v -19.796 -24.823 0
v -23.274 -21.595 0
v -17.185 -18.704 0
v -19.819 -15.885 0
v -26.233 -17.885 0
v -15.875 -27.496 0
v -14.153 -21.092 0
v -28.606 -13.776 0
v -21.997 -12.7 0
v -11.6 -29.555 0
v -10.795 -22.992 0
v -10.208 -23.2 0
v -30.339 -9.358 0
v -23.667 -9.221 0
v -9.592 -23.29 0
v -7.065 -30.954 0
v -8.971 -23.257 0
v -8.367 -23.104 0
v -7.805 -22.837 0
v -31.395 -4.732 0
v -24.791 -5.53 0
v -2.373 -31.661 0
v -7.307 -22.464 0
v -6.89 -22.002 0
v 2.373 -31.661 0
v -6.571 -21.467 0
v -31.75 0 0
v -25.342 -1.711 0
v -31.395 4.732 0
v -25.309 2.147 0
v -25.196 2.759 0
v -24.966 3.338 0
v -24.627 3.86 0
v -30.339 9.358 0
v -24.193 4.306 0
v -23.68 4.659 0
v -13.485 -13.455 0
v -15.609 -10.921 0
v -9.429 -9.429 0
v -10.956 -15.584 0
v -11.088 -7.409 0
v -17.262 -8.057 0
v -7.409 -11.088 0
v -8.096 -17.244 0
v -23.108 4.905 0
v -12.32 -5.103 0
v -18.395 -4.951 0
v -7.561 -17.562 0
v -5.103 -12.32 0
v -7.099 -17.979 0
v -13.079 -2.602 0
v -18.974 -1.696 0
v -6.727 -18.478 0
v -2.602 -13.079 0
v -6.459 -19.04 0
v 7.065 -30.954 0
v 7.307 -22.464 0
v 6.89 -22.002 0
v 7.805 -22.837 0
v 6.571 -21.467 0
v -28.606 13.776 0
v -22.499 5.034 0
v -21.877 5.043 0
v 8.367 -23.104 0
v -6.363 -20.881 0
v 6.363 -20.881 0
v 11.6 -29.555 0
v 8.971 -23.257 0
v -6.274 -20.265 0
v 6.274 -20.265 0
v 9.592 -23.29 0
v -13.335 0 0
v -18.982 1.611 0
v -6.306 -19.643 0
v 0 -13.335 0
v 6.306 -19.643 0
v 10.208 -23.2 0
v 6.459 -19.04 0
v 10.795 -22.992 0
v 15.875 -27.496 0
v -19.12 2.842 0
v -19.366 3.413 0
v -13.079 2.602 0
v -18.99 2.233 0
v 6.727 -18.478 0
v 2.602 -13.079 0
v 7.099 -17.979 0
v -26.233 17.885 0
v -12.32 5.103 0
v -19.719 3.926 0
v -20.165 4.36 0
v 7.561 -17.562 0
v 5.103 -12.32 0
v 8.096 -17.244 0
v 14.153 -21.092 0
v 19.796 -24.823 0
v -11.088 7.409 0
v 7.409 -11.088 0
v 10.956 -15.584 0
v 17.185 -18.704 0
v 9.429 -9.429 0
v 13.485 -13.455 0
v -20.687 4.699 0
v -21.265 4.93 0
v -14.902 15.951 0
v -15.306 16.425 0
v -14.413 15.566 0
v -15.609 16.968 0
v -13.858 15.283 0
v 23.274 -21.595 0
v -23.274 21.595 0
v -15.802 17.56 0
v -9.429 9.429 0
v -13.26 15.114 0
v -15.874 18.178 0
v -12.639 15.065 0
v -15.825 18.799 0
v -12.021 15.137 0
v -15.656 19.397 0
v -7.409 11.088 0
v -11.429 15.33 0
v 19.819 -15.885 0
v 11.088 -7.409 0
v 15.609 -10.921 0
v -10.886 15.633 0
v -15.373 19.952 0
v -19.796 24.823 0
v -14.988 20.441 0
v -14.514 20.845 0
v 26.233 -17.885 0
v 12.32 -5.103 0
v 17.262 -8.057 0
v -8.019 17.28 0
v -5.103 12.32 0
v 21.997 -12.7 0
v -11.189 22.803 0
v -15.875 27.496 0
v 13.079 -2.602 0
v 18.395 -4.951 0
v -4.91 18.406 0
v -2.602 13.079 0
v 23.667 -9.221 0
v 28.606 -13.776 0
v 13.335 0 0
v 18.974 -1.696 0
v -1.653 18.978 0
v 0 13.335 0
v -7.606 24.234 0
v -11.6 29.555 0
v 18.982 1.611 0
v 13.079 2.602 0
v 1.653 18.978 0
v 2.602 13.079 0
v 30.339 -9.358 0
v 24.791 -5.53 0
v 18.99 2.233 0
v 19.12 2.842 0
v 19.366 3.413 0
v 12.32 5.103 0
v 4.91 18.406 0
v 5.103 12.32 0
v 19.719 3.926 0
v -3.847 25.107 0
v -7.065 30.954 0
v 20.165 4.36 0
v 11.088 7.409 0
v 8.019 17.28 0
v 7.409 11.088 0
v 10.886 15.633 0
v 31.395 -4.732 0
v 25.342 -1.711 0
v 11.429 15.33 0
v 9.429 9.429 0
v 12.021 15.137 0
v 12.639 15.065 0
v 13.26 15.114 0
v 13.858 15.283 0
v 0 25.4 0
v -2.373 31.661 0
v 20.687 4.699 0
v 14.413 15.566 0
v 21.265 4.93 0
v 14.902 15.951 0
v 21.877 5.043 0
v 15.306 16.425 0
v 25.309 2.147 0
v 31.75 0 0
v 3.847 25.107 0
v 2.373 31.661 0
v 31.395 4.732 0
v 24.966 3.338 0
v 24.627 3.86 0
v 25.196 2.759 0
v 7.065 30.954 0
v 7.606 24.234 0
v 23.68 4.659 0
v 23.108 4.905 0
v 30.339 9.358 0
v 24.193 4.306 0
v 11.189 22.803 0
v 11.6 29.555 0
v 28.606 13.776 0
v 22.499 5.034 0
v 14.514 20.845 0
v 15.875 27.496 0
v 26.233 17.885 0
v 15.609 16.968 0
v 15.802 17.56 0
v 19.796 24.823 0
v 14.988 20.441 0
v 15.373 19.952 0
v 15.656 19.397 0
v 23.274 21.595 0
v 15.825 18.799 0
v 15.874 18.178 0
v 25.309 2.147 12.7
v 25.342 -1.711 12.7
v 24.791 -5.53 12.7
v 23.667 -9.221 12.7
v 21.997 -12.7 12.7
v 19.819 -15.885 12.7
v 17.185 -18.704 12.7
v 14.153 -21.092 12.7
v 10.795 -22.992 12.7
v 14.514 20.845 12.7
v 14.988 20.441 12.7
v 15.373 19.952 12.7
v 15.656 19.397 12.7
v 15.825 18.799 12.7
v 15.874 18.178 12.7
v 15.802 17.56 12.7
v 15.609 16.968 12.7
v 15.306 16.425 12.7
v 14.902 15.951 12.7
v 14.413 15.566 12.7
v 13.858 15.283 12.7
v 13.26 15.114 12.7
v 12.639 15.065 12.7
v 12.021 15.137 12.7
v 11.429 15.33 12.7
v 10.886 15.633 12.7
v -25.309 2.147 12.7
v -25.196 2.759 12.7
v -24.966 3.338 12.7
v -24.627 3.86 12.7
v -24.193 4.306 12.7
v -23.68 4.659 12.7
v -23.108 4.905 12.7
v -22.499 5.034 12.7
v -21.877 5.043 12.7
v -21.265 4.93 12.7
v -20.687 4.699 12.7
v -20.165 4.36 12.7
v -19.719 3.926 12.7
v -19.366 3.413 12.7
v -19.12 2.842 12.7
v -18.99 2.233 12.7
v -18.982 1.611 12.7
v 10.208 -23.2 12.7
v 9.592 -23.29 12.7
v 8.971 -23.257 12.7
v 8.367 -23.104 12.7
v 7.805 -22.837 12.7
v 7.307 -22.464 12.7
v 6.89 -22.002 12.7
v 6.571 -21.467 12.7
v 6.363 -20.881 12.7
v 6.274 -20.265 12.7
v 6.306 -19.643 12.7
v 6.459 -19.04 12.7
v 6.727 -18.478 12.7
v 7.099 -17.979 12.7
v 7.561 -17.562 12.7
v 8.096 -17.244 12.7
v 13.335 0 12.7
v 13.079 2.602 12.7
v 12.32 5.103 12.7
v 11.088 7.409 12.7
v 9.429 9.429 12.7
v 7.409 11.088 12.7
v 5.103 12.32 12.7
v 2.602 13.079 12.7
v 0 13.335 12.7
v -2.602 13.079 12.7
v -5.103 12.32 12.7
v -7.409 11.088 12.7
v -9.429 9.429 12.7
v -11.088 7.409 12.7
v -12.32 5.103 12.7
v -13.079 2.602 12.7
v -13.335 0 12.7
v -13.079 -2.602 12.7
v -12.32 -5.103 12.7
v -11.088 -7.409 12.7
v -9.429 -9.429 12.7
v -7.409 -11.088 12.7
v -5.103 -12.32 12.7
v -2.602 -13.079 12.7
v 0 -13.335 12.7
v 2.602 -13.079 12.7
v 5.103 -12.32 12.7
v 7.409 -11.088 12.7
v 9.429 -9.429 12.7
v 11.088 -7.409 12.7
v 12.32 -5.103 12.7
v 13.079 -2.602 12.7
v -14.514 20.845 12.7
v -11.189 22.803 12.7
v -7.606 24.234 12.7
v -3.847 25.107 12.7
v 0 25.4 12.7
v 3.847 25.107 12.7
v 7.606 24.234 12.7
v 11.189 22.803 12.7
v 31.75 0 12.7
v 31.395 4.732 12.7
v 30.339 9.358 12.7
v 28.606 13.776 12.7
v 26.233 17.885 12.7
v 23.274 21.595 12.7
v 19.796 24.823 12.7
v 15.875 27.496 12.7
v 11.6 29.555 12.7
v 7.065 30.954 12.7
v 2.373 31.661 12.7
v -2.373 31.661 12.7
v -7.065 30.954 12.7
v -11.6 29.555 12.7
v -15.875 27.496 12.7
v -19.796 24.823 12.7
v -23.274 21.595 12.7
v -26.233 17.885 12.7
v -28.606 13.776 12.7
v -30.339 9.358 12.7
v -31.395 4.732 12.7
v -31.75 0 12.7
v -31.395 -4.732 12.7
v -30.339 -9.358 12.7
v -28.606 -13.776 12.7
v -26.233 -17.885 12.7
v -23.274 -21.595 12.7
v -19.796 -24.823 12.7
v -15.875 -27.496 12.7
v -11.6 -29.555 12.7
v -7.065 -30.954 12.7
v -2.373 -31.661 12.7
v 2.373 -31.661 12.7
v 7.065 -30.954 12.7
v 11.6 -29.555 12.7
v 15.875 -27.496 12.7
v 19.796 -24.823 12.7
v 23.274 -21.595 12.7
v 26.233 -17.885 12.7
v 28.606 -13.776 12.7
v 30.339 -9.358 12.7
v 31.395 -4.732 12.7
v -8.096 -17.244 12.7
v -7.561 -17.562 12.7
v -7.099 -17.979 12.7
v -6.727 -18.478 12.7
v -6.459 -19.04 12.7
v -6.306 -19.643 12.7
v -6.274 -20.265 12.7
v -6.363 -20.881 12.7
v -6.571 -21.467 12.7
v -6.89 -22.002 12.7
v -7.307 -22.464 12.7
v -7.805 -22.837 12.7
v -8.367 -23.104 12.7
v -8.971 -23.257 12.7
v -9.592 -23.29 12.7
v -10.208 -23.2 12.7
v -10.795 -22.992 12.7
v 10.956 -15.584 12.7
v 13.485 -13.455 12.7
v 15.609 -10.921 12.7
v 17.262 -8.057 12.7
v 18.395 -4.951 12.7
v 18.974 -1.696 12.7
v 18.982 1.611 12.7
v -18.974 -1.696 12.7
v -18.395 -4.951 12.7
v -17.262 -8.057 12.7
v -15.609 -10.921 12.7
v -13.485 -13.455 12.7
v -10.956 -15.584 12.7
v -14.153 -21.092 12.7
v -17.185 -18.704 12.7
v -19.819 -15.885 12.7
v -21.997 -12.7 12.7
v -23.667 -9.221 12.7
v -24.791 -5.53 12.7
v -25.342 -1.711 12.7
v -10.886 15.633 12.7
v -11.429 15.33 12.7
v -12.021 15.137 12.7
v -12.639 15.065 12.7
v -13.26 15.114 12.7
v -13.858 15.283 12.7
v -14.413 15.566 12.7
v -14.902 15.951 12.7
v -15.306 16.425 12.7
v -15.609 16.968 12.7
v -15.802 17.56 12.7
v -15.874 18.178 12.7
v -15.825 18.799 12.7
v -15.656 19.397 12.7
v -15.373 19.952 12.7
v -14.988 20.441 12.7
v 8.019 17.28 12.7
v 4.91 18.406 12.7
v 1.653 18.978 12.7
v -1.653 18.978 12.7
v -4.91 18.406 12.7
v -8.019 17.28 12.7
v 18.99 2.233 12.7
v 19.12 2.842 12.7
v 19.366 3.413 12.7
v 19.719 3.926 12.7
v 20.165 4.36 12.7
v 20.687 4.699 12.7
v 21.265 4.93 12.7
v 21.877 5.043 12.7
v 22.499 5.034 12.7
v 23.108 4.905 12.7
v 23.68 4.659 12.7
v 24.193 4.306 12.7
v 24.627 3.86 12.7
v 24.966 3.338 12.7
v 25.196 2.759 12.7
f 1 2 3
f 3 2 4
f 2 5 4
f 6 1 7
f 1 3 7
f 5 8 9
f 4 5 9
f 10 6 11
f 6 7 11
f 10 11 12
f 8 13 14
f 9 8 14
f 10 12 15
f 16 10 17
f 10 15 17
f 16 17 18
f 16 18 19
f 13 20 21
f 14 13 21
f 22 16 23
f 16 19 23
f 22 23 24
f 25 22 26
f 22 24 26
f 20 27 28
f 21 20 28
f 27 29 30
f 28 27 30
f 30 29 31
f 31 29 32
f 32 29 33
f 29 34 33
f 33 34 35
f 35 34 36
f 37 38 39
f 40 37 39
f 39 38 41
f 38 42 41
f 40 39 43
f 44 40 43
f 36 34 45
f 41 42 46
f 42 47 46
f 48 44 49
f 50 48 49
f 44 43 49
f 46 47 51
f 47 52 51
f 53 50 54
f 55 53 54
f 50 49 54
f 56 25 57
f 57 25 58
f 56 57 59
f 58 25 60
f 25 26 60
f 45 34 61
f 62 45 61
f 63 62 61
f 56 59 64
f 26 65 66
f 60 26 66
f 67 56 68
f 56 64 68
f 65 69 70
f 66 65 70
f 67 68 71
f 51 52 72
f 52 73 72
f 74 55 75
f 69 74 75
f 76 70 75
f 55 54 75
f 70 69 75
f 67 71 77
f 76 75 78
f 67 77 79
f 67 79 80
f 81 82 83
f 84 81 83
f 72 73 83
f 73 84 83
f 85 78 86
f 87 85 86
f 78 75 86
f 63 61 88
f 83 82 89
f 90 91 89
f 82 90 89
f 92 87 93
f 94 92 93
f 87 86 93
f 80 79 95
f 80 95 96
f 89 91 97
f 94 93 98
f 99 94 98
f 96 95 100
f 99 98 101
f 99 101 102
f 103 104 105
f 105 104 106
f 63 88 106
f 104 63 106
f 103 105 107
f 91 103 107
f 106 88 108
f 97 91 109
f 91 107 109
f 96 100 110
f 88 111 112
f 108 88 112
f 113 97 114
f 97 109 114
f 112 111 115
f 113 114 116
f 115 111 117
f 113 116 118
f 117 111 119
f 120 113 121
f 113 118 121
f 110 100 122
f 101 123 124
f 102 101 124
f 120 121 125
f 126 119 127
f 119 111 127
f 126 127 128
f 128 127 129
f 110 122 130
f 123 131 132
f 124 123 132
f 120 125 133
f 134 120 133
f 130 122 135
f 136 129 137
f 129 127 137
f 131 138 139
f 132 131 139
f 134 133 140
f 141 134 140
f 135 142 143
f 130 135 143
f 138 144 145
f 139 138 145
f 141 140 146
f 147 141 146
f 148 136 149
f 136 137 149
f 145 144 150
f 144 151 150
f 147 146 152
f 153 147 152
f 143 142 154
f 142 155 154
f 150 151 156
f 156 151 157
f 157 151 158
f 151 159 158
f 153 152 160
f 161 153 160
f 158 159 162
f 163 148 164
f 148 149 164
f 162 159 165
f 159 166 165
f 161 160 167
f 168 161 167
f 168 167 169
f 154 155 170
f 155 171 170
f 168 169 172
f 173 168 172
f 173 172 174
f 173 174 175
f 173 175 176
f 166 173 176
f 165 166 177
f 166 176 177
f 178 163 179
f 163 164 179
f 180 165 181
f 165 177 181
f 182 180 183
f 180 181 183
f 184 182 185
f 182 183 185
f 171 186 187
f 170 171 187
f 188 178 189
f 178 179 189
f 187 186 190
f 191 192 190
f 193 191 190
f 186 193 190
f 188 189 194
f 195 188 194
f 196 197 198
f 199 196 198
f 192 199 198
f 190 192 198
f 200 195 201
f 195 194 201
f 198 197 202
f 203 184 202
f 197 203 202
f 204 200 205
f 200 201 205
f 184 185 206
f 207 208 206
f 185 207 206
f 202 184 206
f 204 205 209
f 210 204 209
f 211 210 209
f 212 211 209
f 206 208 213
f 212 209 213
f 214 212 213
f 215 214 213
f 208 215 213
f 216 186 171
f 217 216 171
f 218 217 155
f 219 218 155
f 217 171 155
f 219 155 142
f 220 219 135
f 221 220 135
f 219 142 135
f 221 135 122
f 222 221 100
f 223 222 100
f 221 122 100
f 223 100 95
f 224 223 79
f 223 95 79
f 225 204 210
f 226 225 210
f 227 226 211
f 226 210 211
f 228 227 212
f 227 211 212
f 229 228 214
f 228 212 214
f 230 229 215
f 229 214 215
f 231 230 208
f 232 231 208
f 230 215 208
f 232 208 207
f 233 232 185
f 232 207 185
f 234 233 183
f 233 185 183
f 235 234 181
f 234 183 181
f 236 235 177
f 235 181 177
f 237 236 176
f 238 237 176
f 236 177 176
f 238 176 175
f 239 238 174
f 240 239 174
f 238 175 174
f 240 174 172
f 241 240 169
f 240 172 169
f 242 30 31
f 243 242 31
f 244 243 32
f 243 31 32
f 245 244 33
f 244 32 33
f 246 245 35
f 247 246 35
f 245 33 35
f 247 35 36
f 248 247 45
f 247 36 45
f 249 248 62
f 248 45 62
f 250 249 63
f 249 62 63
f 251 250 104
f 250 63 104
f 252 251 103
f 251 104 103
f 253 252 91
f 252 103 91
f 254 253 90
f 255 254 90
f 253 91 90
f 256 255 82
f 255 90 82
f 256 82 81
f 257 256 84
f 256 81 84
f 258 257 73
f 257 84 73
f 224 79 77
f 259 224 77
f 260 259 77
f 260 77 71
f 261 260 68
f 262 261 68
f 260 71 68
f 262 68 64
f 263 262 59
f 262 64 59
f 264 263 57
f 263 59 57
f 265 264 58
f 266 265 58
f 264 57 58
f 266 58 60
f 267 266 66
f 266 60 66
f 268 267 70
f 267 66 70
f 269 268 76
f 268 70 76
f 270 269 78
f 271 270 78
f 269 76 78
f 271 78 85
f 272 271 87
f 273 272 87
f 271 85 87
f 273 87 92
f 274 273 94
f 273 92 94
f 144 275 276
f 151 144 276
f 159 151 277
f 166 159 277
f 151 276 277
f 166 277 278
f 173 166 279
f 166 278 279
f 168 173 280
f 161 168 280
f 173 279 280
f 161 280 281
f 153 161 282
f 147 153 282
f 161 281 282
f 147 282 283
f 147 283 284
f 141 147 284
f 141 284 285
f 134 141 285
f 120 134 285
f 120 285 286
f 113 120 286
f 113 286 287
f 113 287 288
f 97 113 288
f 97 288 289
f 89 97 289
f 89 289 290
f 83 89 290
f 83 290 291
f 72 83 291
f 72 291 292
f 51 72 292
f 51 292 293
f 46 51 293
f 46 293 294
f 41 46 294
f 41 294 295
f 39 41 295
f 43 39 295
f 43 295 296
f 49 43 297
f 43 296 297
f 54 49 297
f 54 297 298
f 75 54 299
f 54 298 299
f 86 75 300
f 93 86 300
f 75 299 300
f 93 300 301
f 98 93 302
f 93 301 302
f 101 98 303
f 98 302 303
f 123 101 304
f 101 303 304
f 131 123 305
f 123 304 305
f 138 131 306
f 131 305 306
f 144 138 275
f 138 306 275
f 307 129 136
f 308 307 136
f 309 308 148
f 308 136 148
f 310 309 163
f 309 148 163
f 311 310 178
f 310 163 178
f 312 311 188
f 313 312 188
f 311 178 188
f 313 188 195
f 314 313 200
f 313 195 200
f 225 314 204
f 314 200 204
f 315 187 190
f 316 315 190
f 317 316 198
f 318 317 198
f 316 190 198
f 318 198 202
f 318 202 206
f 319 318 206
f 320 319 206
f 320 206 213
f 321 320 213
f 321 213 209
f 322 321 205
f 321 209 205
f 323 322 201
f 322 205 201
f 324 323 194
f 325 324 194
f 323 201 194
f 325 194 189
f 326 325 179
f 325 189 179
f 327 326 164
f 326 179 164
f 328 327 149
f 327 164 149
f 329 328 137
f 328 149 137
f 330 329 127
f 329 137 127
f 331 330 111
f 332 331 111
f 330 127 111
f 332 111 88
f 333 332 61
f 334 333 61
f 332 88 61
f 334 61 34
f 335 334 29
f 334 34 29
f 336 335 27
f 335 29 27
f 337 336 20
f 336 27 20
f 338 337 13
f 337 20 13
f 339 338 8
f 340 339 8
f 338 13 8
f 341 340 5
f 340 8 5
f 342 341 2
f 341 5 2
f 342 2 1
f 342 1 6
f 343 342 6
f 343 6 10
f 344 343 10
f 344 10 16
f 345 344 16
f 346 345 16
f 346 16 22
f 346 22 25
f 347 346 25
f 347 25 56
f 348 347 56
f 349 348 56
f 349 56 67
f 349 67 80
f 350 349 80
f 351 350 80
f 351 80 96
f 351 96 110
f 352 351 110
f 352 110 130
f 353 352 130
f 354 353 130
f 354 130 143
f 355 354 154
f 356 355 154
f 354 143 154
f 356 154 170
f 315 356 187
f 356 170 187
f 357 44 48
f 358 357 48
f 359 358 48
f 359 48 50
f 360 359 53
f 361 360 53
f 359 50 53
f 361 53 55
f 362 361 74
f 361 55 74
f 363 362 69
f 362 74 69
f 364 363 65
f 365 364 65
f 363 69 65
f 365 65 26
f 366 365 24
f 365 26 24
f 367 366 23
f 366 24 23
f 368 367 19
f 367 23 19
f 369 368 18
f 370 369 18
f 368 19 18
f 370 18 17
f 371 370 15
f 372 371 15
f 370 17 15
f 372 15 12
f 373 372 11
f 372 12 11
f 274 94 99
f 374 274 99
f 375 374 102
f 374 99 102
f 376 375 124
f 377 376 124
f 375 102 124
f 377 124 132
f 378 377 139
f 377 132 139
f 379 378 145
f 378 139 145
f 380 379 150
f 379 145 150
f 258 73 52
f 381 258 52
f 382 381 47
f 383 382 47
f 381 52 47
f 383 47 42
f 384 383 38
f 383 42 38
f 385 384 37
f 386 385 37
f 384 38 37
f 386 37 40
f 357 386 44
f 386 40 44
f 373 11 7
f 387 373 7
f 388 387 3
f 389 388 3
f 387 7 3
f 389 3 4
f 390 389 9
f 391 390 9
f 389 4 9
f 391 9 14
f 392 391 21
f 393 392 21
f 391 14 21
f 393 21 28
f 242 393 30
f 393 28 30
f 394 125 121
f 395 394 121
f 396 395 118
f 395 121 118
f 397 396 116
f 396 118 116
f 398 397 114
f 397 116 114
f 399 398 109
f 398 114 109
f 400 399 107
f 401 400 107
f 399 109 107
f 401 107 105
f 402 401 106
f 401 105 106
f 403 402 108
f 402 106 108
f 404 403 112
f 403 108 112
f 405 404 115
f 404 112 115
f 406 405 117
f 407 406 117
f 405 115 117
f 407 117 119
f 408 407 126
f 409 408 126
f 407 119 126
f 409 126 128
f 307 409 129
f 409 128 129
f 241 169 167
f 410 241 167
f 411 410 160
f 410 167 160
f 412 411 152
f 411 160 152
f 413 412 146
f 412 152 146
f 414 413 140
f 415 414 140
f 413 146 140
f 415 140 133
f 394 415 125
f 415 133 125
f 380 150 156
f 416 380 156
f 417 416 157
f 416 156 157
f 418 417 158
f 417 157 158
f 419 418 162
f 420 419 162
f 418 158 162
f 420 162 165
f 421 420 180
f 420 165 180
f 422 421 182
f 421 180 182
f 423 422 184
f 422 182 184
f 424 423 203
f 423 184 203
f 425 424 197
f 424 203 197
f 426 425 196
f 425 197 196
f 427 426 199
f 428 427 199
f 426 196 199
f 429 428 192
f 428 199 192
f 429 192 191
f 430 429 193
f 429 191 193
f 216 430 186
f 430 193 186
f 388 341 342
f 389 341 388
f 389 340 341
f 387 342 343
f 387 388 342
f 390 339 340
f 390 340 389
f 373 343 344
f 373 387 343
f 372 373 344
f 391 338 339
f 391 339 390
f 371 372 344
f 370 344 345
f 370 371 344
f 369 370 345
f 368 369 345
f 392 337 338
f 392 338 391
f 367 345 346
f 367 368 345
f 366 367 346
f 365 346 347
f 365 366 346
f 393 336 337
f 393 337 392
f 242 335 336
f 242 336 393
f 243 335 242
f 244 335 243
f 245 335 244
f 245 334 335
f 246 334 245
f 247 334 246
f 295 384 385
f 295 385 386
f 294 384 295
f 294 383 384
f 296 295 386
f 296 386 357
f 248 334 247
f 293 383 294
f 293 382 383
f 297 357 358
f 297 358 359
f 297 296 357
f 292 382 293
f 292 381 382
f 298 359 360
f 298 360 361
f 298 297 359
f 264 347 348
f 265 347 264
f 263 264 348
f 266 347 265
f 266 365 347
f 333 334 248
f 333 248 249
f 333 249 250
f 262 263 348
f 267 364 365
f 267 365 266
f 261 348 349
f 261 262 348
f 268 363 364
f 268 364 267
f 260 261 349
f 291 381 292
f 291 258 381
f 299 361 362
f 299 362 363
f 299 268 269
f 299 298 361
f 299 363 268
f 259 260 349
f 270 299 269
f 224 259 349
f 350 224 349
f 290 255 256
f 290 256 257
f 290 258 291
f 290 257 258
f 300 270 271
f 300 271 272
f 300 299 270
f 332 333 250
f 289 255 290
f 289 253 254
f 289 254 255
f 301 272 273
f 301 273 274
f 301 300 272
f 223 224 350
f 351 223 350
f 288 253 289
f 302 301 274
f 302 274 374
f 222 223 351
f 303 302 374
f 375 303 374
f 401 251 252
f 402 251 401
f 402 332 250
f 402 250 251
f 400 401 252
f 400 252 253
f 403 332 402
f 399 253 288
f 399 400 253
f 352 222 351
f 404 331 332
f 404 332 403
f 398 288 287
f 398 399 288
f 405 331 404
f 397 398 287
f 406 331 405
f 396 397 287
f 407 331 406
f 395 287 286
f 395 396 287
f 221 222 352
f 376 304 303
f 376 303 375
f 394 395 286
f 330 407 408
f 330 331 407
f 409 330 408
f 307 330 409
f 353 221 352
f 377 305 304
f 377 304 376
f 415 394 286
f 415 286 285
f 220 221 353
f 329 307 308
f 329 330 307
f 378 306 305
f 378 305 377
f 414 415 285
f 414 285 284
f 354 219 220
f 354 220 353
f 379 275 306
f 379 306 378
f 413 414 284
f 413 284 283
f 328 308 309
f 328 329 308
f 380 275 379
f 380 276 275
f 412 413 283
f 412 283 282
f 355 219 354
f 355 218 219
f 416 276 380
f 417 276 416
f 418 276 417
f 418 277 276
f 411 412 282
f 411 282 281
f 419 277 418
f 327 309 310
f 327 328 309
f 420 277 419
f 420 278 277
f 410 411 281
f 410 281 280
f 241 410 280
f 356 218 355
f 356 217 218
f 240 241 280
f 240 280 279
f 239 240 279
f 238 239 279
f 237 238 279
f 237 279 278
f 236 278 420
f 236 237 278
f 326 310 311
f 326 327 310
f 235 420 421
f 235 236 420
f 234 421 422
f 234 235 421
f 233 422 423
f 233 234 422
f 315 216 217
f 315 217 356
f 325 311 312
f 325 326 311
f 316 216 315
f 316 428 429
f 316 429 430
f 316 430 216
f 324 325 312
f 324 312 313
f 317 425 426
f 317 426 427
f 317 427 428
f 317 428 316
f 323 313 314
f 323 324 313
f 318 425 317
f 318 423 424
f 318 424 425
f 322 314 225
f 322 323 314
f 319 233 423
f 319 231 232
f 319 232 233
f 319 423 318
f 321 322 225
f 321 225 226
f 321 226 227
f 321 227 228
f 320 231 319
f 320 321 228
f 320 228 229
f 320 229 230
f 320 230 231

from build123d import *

# Parameters (mm, degrees)
F0_R     = 31.75
F1_DEPTH = 12.7
F2_R     = 13.335
F3_DEPTH = 25.4


with BuildPart() as f1:
    # F0 (on Top) → F1 (new body)
    with BuildSketch(Plane.XY):
        Circle(F0_R)
        with BuildLine():
            ThreePointArc((-10.794772, -22.992018), (-21.997045, -12.7), (-25.309058, 2.147462))
            ThreePointArc((-25.309058, 2.147462), (-21.876993, 5.042662), (-18.981793, 1.610597))
            ThreePointArc((-18.981793, 1.610597), (-16.497784, -9.525), (-8.096079, -17.244014))
            ThreePointArc((-8.096079, -17.244014), (-6.571423, -21.467362), (-10.794772, -22.992018))
        make_face(mode=Mode.SUBTRACT)
        with BuildLine():
            ThreePointArc((25.309058, 2.147462), (21.997045, -12.7), (10.794772, -22.992018))
            ThreePointArc((10.794772, -22.992018), (6.571423, -21.467362), (8.096079, -17.244014))
            ThreePointArc((8.096079, -17.244014), (16.497784, -9.525), (18.981793, 1.610597))
            ThreePointArc((18.981793, 1.610597), (21.876993, 5.042662), (25.309058, 2.147462))
        make_face(mode=Mode.SUBTRACT)
        with BuildLine():
            ThreePointArc((10.885714, 15.633417), (0, 19.05), (-10.885714, 15.633417))
            ThreePointArc((-10.885714, 15.633417), (-15.305569, 16.424701), (-14.514286, 20.844556))
            ThreePointArc((-14.514286, 20.844556), (0, 25.4), (14.514286, 20.844556))
            ThreePointArc((14.514286, 20.844556), (15.305569, 16.424701), (10.885714, 15.633417))
        make_face(mode=Mode.SUBTRACT)
    extrude(amount=F1_DEPTH)

    # F2 (on face) → F3 (cut)
    with BuildSketch(Plane.XY.offset(12.7)):
        Circle(F2_R)
    extrude(amount=-F3_DEPTH, mode=Mode.SUBTRACT)


solid = f1.part
